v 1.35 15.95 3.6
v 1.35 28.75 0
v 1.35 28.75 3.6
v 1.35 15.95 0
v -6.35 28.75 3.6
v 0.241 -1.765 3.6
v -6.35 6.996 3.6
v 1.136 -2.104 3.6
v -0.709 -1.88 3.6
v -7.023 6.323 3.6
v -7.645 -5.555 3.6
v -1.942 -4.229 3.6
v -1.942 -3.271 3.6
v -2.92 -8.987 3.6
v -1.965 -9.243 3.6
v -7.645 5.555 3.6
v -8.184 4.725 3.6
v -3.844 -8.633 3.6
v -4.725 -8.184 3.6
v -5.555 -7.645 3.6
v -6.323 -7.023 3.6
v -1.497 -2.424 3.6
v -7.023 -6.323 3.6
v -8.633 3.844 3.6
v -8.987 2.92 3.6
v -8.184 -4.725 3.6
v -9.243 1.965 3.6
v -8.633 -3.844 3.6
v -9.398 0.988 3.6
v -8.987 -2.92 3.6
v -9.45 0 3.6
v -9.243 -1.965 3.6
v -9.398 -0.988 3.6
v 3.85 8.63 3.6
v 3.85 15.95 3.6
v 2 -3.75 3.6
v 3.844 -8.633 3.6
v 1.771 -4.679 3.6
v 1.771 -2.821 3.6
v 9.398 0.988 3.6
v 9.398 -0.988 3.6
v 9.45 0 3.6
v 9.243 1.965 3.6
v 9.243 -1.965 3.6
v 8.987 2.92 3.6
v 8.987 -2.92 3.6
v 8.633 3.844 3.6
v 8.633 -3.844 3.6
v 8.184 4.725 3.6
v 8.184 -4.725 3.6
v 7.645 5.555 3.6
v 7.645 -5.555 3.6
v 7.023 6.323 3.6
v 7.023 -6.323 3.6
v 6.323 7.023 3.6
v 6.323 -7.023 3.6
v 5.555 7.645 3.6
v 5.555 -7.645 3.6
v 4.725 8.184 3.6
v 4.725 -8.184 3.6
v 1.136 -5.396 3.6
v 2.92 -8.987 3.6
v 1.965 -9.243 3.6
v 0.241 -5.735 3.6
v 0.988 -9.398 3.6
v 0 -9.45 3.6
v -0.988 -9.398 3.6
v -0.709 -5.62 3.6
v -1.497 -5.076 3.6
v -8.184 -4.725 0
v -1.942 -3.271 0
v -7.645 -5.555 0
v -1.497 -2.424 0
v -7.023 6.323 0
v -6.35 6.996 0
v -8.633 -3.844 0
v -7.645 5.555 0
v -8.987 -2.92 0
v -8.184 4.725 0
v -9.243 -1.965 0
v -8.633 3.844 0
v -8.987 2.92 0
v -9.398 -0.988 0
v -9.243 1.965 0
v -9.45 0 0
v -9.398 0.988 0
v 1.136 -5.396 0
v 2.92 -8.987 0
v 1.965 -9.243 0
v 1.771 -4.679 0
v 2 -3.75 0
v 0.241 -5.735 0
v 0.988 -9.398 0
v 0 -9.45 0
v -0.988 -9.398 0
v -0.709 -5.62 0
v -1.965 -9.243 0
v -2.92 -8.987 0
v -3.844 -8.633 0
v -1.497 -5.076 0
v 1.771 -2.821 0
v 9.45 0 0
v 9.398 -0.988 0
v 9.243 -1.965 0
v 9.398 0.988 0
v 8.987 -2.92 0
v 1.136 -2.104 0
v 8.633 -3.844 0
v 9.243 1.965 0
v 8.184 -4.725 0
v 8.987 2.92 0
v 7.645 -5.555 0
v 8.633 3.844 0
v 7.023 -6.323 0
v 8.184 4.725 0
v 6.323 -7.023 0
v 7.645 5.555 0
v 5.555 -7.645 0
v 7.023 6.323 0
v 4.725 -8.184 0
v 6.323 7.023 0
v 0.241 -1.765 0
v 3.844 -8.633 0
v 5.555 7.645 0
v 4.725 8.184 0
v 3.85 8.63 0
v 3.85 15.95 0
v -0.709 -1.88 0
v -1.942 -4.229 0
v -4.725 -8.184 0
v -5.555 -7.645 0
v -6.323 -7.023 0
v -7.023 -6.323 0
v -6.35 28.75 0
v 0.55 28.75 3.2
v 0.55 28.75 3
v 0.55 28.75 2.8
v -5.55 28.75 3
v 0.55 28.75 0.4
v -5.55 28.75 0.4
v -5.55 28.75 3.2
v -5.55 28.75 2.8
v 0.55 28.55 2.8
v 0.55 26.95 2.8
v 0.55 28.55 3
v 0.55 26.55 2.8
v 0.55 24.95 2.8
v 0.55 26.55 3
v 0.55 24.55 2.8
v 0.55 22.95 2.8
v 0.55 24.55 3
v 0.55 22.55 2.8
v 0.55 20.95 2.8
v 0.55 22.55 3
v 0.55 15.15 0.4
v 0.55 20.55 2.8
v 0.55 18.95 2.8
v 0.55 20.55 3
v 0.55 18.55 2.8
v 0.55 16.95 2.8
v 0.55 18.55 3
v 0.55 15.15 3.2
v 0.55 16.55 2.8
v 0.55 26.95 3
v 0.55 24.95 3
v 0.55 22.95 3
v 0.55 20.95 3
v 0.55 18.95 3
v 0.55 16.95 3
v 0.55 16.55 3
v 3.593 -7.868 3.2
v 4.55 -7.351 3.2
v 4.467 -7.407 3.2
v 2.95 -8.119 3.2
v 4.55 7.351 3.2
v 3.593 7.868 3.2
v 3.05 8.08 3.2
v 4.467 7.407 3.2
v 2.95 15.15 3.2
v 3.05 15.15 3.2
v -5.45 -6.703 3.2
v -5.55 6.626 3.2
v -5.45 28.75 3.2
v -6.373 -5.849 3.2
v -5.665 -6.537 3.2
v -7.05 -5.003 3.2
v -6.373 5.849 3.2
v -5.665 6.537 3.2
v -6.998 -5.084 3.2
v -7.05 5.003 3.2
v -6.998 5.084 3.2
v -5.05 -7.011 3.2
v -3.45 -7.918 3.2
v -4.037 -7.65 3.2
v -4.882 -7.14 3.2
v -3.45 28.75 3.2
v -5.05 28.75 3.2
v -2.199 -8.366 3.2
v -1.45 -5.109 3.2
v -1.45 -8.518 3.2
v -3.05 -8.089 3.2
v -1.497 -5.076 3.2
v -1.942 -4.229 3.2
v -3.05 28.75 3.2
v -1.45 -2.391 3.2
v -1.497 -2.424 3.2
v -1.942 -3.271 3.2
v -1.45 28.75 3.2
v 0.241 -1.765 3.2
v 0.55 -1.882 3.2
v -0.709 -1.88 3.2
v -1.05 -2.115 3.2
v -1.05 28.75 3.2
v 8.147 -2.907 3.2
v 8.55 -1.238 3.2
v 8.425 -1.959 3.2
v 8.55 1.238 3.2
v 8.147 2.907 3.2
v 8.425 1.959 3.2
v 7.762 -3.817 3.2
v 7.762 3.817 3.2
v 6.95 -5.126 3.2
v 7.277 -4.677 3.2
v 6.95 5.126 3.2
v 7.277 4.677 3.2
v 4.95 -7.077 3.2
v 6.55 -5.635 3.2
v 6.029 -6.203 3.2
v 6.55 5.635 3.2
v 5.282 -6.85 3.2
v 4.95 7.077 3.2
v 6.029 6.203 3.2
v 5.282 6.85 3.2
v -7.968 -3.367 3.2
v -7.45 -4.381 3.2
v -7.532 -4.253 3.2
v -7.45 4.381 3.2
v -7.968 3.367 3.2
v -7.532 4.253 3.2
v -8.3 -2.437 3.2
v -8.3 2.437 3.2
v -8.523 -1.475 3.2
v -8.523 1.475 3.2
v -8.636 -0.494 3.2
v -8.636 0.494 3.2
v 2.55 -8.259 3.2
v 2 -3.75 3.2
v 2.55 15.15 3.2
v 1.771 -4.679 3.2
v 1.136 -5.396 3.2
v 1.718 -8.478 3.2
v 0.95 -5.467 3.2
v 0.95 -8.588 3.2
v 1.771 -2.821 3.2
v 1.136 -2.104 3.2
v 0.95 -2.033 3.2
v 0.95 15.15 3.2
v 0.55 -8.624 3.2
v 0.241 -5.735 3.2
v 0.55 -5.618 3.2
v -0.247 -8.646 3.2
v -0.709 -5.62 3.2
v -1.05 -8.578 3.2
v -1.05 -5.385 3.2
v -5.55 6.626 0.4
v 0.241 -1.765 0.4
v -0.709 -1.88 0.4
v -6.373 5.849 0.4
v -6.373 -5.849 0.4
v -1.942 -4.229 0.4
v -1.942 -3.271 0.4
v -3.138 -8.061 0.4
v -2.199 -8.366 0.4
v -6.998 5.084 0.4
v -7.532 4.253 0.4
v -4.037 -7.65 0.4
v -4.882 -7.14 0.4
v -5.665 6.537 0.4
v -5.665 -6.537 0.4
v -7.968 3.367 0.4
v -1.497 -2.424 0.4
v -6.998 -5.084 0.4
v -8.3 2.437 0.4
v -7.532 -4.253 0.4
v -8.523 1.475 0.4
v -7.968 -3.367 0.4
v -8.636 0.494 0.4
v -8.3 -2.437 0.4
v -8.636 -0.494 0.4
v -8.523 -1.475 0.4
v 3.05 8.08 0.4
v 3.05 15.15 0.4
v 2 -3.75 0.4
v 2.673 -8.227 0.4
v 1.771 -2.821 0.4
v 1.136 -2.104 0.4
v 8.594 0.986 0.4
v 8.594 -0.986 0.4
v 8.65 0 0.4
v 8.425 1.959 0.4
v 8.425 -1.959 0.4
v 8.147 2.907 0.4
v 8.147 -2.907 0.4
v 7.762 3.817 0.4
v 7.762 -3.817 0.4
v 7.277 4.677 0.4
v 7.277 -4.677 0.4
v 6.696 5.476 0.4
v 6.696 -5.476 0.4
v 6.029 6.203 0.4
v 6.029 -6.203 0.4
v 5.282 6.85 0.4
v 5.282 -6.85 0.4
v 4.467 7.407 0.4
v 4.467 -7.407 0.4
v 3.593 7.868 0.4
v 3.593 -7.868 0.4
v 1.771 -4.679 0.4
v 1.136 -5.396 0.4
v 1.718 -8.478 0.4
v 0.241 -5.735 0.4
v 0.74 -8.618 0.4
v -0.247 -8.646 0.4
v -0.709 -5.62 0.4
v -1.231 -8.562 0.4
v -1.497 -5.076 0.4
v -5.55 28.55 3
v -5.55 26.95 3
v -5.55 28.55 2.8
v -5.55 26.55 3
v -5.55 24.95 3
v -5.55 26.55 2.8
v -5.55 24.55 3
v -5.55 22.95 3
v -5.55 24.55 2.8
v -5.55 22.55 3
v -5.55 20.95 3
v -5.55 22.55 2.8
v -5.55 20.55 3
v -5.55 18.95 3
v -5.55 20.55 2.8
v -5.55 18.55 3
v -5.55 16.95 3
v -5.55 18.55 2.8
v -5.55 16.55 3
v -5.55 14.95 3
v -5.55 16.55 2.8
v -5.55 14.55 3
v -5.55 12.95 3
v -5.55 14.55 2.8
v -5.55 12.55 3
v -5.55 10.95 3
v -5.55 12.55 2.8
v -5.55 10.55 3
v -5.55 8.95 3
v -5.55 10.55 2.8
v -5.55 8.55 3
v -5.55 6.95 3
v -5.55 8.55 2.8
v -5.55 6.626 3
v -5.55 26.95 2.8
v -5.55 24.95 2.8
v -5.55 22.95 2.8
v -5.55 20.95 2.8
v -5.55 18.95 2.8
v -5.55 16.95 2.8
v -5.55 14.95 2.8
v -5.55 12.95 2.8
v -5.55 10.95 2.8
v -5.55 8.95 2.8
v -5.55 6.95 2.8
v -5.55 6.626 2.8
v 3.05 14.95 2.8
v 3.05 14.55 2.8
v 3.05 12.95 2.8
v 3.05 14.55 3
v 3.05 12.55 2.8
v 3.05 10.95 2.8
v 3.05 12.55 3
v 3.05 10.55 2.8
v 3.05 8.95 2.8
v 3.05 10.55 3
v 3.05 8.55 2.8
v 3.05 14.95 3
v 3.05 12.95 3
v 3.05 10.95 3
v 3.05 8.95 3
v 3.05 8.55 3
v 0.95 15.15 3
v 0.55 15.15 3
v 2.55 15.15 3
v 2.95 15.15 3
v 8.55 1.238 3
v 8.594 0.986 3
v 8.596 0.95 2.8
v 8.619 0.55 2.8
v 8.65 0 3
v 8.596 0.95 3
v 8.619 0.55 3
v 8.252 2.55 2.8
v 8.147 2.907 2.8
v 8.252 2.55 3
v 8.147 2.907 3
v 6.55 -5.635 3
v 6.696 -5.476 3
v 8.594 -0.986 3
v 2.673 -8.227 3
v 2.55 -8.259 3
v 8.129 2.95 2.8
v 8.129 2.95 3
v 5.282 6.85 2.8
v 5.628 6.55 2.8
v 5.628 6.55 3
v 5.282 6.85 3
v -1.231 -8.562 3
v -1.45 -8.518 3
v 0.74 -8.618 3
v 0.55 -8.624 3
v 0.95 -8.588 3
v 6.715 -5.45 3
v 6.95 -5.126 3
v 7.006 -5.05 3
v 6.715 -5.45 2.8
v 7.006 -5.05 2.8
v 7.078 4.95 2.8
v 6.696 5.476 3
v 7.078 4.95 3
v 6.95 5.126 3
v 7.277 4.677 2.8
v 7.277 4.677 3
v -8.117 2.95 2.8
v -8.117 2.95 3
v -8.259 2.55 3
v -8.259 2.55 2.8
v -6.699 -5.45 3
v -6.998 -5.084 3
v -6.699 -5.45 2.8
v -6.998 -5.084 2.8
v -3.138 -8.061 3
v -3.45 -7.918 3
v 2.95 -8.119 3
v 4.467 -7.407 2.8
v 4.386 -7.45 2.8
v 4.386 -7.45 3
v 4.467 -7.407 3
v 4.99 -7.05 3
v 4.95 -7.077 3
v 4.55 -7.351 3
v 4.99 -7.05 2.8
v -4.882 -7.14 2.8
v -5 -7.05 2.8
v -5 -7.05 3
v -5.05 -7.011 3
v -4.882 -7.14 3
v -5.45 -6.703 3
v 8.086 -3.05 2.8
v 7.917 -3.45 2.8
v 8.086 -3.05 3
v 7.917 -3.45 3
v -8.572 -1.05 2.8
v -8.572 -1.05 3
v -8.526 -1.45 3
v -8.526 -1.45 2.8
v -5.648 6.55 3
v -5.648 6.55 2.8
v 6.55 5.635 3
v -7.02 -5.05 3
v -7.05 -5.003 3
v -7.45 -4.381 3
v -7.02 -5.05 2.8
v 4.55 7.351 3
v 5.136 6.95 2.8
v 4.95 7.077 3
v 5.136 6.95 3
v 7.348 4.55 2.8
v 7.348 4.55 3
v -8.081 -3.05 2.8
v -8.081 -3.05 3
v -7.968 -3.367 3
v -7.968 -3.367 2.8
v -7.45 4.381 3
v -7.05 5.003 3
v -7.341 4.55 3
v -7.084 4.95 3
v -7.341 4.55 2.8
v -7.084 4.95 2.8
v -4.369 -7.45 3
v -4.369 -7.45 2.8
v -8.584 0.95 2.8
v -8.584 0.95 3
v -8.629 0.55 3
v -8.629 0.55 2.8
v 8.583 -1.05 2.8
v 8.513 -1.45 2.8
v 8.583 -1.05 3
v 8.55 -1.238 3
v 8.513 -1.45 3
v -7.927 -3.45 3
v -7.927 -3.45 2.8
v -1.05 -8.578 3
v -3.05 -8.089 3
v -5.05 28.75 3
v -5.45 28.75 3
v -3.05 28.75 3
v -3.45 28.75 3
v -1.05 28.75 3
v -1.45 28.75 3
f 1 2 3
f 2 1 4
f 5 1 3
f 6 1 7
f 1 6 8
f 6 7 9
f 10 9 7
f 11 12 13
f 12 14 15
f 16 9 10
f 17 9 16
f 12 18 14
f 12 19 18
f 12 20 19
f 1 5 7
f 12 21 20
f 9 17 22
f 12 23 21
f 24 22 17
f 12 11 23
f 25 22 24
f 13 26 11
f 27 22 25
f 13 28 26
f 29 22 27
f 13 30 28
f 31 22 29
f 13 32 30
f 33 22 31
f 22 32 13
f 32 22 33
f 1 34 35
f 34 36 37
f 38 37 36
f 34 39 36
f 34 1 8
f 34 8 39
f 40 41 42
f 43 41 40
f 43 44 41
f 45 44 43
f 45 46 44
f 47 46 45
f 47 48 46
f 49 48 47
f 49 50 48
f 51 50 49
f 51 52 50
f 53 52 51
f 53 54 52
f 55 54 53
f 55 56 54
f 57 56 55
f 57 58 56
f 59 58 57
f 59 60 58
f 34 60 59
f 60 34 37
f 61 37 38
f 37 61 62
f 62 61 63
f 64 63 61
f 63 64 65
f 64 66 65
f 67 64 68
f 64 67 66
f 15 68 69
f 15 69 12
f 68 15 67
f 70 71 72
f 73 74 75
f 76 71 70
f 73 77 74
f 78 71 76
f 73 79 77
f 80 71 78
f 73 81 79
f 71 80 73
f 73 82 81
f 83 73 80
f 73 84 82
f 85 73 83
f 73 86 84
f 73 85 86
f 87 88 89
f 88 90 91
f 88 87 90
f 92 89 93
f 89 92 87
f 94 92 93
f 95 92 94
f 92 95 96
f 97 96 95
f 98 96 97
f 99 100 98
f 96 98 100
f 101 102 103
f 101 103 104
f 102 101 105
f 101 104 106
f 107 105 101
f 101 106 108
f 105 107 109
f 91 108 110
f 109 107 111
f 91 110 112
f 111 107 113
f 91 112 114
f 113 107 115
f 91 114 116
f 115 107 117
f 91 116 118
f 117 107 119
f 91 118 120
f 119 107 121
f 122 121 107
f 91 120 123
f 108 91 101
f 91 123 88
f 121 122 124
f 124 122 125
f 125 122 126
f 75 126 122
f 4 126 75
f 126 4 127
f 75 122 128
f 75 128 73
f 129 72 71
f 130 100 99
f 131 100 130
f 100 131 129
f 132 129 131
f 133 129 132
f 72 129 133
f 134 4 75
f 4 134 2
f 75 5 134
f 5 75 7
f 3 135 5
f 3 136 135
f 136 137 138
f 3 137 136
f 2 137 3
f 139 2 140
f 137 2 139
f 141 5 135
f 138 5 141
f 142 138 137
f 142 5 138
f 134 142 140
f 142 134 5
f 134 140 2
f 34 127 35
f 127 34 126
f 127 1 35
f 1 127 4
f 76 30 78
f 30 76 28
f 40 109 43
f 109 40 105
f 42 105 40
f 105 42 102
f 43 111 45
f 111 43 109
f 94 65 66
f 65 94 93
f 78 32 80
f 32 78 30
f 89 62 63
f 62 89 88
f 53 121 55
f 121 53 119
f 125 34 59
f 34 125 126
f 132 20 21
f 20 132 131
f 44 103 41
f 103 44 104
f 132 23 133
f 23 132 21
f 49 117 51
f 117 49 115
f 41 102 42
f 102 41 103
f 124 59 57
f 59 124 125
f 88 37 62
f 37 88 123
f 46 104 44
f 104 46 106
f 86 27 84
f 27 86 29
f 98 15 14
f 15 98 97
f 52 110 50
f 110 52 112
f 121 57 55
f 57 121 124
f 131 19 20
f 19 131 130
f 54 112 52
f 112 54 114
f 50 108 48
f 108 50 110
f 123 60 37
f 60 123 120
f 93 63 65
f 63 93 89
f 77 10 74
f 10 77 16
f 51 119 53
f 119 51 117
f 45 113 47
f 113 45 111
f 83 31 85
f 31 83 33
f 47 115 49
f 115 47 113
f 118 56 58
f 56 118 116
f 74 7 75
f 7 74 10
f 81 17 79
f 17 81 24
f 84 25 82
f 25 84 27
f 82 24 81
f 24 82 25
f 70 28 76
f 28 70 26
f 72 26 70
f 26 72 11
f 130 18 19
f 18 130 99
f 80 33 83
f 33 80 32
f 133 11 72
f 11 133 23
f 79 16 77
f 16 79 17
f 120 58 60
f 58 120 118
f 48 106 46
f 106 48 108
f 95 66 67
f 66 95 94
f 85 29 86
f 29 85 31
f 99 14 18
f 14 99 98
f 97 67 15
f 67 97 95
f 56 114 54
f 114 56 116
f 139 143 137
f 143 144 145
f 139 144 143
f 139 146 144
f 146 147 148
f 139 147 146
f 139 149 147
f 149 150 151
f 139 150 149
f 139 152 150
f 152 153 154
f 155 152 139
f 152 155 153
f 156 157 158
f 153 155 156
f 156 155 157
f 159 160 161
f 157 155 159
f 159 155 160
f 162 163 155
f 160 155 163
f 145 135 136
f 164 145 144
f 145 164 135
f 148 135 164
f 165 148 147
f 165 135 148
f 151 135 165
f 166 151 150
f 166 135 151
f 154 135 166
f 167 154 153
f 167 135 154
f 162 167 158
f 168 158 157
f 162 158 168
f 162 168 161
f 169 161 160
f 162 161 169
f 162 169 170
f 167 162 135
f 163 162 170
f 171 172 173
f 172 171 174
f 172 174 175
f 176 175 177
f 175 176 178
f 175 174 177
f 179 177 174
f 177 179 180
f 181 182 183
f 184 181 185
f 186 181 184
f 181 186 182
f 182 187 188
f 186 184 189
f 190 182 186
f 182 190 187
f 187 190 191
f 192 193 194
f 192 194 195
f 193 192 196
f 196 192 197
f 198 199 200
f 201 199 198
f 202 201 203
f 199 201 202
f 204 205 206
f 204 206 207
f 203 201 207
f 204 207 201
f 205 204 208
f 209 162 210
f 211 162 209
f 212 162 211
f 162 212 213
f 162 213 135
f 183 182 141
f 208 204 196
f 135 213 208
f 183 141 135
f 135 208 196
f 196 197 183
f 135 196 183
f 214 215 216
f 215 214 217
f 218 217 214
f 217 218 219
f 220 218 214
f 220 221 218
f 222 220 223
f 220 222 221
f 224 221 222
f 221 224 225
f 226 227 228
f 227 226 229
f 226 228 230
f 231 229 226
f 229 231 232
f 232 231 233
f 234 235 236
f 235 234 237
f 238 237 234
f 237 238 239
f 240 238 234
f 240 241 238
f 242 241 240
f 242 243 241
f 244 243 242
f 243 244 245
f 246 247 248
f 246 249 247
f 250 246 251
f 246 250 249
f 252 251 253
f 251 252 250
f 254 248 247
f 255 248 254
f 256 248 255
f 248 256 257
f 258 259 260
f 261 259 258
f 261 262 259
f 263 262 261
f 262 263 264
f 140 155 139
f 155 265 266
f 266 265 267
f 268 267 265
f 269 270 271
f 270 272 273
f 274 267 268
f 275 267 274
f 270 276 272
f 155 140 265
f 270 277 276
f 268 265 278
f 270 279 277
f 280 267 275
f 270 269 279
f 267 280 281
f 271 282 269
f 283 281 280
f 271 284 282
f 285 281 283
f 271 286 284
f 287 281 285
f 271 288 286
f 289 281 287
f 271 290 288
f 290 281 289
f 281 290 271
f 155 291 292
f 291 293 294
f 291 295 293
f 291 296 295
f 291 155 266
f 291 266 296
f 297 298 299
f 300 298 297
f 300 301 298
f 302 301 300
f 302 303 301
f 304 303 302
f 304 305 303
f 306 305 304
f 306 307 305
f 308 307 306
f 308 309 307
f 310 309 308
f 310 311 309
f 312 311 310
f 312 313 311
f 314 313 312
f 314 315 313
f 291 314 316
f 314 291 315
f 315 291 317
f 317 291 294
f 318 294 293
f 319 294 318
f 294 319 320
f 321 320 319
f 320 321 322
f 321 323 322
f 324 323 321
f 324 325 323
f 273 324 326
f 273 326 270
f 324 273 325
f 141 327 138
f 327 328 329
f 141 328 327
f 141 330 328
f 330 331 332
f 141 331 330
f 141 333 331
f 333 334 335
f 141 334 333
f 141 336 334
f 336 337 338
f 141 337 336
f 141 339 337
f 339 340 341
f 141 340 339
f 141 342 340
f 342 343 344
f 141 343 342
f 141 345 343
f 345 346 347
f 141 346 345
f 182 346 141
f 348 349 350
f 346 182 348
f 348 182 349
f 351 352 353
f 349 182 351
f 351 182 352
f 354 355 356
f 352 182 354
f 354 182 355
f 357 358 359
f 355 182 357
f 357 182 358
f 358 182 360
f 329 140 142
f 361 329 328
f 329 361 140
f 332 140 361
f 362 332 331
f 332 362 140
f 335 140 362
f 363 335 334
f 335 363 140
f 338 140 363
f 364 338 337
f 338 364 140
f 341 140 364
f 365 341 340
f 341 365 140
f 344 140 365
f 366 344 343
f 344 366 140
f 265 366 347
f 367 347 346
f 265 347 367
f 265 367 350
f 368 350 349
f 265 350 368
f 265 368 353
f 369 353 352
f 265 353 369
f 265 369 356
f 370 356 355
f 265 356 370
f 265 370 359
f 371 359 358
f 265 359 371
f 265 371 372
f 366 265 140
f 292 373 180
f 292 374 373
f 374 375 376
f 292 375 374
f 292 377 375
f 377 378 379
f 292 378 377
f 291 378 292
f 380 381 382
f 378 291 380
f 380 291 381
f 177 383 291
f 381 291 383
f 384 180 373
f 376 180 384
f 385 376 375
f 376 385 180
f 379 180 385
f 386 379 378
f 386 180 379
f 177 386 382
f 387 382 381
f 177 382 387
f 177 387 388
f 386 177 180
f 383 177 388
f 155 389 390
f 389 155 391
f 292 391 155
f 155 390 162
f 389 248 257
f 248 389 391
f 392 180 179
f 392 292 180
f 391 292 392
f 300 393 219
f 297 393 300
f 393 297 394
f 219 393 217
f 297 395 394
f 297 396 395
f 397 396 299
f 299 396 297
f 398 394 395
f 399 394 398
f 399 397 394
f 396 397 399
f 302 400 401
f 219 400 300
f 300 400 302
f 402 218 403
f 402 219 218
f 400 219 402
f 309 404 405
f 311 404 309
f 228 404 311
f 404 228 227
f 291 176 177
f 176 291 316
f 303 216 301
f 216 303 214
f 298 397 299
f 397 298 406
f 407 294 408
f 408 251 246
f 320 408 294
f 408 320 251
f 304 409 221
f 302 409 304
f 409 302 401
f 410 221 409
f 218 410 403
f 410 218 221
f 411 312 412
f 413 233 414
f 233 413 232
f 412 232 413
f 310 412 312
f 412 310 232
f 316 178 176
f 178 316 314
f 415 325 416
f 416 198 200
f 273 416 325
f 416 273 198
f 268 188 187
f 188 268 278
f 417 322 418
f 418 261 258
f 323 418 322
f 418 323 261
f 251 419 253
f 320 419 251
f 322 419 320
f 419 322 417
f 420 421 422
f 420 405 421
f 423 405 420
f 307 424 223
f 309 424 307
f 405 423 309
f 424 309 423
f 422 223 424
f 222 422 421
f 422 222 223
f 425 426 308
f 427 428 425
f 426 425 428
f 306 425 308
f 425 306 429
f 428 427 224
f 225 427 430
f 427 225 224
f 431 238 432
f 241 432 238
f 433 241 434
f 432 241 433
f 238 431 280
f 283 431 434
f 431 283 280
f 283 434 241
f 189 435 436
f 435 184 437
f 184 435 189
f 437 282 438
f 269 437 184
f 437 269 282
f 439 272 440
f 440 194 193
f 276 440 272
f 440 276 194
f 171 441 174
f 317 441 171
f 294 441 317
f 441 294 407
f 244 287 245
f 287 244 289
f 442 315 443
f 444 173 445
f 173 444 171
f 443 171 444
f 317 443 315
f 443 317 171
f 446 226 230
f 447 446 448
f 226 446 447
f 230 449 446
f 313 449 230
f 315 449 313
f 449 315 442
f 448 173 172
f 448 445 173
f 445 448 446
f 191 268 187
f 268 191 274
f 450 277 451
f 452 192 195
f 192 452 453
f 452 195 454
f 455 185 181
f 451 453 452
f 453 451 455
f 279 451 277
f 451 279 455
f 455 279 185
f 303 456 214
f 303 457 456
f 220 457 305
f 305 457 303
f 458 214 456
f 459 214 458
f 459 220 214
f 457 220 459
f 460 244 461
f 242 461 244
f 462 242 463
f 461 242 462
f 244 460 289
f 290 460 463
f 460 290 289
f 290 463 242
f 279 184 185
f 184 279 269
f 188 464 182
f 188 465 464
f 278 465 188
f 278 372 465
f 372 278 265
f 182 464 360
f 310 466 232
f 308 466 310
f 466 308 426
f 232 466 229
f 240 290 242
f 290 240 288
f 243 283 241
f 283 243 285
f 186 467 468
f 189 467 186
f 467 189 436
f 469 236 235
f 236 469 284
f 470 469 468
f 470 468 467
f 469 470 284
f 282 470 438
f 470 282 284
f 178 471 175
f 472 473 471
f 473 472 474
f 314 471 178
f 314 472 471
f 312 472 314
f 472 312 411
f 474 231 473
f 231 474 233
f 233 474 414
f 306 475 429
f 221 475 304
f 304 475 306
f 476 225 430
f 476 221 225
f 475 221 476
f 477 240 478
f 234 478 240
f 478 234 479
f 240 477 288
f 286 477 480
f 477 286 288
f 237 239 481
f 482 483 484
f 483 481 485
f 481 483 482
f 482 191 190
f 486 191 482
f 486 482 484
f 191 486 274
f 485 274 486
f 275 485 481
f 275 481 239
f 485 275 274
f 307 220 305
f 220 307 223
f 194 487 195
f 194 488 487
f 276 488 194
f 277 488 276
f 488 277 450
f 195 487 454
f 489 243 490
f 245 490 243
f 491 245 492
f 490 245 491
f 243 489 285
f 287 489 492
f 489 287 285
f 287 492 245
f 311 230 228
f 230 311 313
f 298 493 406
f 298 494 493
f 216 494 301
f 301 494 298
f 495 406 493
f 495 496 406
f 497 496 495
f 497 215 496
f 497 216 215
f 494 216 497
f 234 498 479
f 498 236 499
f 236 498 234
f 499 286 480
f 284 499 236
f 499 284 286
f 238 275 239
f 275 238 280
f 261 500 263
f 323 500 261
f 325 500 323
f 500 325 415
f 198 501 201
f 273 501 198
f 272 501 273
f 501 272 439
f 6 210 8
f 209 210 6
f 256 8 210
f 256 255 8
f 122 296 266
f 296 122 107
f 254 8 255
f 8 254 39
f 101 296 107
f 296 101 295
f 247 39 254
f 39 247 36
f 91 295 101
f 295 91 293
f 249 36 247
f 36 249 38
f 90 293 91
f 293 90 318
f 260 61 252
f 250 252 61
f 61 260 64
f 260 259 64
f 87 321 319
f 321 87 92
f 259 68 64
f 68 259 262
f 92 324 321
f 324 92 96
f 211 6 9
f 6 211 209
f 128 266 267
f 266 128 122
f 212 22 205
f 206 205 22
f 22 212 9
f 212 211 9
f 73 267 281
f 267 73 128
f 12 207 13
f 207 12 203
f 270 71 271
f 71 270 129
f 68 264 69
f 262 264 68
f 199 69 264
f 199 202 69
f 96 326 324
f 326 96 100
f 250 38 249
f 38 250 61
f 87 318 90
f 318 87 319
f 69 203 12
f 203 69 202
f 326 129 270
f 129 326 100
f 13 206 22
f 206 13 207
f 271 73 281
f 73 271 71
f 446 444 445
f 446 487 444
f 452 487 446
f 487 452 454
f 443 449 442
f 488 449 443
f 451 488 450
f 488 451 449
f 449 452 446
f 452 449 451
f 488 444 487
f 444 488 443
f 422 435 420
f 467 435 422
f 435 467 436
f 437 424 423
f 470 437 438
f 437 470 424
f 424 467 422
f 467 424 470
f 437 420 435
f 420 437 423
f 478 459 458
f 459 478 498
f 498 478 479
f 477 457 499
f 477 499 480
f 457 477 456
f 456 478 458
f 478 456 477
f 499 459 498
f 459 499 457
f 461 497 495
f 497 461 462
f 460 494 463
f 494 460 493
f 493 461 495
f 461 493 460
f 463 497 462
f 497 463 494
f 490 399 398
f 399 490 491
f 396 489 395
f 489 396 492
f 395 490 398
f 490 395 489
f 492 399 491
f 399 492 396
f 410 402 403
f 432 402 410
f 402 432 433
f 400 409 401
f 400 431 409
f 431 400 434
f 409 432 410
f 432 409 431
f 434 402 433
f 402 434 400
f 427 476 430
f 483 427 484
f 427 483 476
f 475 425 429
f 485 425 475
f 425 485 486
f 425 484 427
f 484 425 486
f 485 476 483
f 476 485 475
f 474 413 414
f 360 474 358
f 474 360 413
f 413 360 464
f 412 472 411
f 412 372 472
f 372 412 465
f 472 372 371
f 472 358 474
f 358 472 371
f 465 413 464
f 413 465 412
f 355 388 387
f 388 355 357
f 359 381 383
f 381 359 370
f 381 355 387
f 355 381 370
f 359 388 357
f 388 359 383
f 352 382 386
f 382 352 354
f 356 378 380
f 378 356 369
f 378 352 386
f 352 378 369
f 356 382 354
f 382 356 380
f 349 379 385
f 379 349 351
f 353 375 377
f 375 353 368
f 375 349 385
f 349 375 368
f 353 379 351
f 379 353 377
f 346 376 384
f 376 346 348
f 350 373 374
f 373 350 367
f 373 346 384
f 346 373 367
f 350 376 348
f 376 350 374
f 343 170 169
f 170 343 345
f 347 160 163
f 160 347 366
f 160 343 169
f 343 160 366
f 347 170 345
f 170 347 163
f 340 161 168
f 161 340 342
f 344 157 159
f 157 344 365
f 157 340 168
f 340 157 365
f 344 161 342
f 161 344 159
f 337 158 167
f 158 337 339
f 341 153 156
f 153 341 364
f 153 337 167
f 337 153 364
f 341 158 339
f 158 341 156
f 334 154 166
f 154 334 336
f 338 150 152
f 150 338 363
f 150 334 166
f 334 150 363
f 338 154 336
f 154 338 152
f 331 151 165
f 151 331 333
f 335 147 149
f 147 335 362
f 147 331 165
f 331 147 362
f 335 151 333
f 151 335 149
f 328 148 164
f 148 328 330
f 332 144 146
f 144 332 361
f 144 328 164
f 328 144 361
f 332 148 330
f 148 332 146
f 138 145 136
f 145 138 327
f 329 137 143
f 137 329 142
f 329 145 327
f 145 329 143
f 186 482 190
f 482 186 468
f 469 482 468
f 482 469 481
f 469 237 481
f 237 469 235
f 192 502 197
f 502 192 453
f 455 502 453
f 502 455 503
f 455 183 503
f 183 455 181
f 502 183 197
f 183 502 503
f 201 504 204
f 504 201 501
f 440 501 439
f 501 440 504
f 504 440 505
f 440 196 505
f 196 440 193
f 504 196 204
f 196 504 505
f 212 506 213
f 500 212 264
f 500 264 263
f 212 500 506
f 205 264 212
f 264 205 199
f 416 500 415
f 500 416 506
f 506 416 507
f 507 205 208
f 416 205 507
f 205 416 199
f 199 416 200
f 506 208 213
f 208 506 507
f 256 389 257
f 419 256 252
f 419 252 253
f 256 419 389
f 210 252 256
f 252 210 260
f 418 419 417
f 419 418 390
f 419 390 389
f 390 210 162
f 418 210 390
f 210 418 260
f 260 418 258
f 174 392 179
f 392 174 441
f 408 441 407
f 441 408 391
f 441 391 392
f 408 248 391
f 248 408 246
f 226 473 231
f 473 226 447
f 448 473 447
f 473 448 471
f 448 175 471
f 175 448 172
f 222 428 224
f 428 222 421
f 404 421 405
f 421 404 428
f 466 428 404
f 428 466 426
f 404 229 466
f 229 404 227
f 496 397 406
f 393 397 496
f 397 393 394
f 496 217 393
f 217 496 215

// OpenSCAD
// -*- mode: SCAD ; c-file-style: "ellemtel" ; coding: utf-8 -*-
//
// Key seal.
//
// Copyright 2018 Roland Sieker <ospalh@gmail.com>
// Licence: CC-BY-SA 4.0

// The bow is the "grip" of the key
bow_shape = 0; // [0: circular, 1: rectangular]

// Diameter of the key's circular bow.
bow_diameter = 16.5;  // [5:0.1:40]

// Size of the rectangular bow normal to the insertion direction
bow_width = 19;  // [5:0.1:40]

// Size of the rectangular bow in insertion direction
bow_length = 12;  // [5:0.1:40]


// Thickness of the key.
thickness = 2;  // [0.5:0.1:5]


// The length of the bit you insert into the lock from tip to bow
blade_length = 18.5;  // [5:0.1:40]

// The width of the blade
blade_width = 5.3;  // [1:0.1:20]

// The shoulder is the bit that stops you from pushing in the key too far. This is the extra width of the protrusion.
shoulder_width = 2.5;  // [1:0.1:10]

// Distance from the bow to the shoulder.
shoulder_length = 6.5;  // [1:0.1:15]

// Key ring hole diameter
ring_hole_diameter = 4;  // [0.5:0.1:5]

// Distance of the ring hole from the edge of the key
ring_hole_land = 2.5;  // [0.5:0.1:5]

// How much the ring hole is offset towards the cuts and shoulder side. Manual correction of the land width needed for circular bows.
ring_hole_offset = 0;  // [-20:0.1:20]

// How much the blade itself offset towards the cuts and shoulder side. Manual correction of the land width needed for circular bows.
blade_offset = -2.5;  // [-20:0.1:20]

// Set this to "render" and click on "Create Thing" when done with the setup.
preview = 1; // [0:render, 1:preview]


/* [Hidden] */

// Done with the customizer.

// *******************************************************
// Extra parameters. These can be changed reasonably safely.

w = 0.8;  // external wall width
p = 0.4;  // height of the bottomt plate
c = 0.4;  // clearance

lh = 0.2; // layer height
nw = 0.4;  // nozzle width

sh = lh * 2;  // We do two layers of strakes or stringers

// *******************************************************
// Some shortcuts. These shouldn't be changed

angle = 60; // Overhangs much below 60 degrees are a problem for me
xy_factor = 1/tan(angle);  // To get from a height to a horizontal width
                           // inclined correctly
z_factor = tan(angle);  // the other way around

rb = bow_shape ? bow_length/2 : bow_diameter / 2;
kw = bow_shape ? bow_width/2 : bow_diameter / 2;
h = thickness;

some_distance = 50;
ms = 0.01;  // Muggeseggele.

// fn for differently sized objects and fs, fa,  all for preview or rendering.
pna = 40;
pnb = 15;
pa = 5;
ps = 1;
rna = 180;
rnb = 30;
ra = 1;
rs = 0.1;
function na() = (preview) ? pna : rna;
function nb() = (preview) ? pnb : rnb;
$fs = (preview) ? ps : rs;
$fa = (preview) ? pa : ra;

// *******************************************************
// End setup



// *******************************************************
// Generate the part

key_seal();

// Test
// %solid_key_seal();
// %key_hollow();
// #strakes();

// *******************************************************
// Code for the parts themselves


module key_seal()
{
   difference()
   {
      solid_key_seal();
      key_hollow();
   }
   intersection()
   {
      solid_key_seal();
      strakes();
   }
}

module solid_key_seal()
{

   if (bow_shape)
   {
      translate([-bow_width/2-c-w, -bow_length/2-c-w, 0])
      {
         cube([bow_width+2*c+2*w, bow_length+2*c+2*w, h+2*p+c+sh]);
      }
   }
   else
   {
      cylinder(r=rb+w+c, h=h+2*p+c+sh);
   }
   translate([blade_offset, 0, 0])
   {
   translate([-blade_width/2-c-w, 0, 0])
      {
         cube([blade_width+2*c+2*w, blade_length+w+rb+w+c, h+2*p+c+sh]);
      }
   cube([blade_width/2+shoulder_width+c+w, rb+shoulder_length+c+w, h+2*p+c+sh]);
}
}

module key_hollow()
{
   translate([0,0,p])
   {
      if (bow_shape)
      {
         translate([-bow_width/2-c, -bow_length/2-c, 0])
         {
            cube([bow_width+2*c, bow_length+2*c, h+c+sh]);
         }
      }
      else
      {
         cylinder(r=rb+c, h=h+c+sh);
      }
     translate([blade_offset, 0, 0])
     {
      translate([-blade_width/2-c, 0, 0])
      {
         cube([blade_width+2*c, some_distance, h+c+sh]);
      }
      cube([blade_width/2+shoulder_width+c, rb+shoulder_length+c, h+c+sh]);
      }
   }
   translate([ring_hole_offset, -rb + ring_hole_land + ring_hole_diameter/2,-ms])
   {
      cylinder(d=ring_hole_diameter, h=h+2*p+c+sh+2*ms);
   }
}


module strakes()
{

   translate([-rb-c-w,-kw-c-w,h+p+c])
   {
      for (so=[0:5*nw: blade_length+w+2*rb+2*w+2*c])
      {
         translate([0,so,0])
         {
            cube([2*rb+2*c+2*w, nw, lh]);
         }
      }

      translate([0,0, lh])
      {
         for (st=[0:5*nw: 2*rb+2*w+2*c])
         {
            translate([st, 0, 0])
            {
               cube([nw, blade_length+w+2*rb+2*w+2*c, lh]);
            }
         }
      }
   }
}
